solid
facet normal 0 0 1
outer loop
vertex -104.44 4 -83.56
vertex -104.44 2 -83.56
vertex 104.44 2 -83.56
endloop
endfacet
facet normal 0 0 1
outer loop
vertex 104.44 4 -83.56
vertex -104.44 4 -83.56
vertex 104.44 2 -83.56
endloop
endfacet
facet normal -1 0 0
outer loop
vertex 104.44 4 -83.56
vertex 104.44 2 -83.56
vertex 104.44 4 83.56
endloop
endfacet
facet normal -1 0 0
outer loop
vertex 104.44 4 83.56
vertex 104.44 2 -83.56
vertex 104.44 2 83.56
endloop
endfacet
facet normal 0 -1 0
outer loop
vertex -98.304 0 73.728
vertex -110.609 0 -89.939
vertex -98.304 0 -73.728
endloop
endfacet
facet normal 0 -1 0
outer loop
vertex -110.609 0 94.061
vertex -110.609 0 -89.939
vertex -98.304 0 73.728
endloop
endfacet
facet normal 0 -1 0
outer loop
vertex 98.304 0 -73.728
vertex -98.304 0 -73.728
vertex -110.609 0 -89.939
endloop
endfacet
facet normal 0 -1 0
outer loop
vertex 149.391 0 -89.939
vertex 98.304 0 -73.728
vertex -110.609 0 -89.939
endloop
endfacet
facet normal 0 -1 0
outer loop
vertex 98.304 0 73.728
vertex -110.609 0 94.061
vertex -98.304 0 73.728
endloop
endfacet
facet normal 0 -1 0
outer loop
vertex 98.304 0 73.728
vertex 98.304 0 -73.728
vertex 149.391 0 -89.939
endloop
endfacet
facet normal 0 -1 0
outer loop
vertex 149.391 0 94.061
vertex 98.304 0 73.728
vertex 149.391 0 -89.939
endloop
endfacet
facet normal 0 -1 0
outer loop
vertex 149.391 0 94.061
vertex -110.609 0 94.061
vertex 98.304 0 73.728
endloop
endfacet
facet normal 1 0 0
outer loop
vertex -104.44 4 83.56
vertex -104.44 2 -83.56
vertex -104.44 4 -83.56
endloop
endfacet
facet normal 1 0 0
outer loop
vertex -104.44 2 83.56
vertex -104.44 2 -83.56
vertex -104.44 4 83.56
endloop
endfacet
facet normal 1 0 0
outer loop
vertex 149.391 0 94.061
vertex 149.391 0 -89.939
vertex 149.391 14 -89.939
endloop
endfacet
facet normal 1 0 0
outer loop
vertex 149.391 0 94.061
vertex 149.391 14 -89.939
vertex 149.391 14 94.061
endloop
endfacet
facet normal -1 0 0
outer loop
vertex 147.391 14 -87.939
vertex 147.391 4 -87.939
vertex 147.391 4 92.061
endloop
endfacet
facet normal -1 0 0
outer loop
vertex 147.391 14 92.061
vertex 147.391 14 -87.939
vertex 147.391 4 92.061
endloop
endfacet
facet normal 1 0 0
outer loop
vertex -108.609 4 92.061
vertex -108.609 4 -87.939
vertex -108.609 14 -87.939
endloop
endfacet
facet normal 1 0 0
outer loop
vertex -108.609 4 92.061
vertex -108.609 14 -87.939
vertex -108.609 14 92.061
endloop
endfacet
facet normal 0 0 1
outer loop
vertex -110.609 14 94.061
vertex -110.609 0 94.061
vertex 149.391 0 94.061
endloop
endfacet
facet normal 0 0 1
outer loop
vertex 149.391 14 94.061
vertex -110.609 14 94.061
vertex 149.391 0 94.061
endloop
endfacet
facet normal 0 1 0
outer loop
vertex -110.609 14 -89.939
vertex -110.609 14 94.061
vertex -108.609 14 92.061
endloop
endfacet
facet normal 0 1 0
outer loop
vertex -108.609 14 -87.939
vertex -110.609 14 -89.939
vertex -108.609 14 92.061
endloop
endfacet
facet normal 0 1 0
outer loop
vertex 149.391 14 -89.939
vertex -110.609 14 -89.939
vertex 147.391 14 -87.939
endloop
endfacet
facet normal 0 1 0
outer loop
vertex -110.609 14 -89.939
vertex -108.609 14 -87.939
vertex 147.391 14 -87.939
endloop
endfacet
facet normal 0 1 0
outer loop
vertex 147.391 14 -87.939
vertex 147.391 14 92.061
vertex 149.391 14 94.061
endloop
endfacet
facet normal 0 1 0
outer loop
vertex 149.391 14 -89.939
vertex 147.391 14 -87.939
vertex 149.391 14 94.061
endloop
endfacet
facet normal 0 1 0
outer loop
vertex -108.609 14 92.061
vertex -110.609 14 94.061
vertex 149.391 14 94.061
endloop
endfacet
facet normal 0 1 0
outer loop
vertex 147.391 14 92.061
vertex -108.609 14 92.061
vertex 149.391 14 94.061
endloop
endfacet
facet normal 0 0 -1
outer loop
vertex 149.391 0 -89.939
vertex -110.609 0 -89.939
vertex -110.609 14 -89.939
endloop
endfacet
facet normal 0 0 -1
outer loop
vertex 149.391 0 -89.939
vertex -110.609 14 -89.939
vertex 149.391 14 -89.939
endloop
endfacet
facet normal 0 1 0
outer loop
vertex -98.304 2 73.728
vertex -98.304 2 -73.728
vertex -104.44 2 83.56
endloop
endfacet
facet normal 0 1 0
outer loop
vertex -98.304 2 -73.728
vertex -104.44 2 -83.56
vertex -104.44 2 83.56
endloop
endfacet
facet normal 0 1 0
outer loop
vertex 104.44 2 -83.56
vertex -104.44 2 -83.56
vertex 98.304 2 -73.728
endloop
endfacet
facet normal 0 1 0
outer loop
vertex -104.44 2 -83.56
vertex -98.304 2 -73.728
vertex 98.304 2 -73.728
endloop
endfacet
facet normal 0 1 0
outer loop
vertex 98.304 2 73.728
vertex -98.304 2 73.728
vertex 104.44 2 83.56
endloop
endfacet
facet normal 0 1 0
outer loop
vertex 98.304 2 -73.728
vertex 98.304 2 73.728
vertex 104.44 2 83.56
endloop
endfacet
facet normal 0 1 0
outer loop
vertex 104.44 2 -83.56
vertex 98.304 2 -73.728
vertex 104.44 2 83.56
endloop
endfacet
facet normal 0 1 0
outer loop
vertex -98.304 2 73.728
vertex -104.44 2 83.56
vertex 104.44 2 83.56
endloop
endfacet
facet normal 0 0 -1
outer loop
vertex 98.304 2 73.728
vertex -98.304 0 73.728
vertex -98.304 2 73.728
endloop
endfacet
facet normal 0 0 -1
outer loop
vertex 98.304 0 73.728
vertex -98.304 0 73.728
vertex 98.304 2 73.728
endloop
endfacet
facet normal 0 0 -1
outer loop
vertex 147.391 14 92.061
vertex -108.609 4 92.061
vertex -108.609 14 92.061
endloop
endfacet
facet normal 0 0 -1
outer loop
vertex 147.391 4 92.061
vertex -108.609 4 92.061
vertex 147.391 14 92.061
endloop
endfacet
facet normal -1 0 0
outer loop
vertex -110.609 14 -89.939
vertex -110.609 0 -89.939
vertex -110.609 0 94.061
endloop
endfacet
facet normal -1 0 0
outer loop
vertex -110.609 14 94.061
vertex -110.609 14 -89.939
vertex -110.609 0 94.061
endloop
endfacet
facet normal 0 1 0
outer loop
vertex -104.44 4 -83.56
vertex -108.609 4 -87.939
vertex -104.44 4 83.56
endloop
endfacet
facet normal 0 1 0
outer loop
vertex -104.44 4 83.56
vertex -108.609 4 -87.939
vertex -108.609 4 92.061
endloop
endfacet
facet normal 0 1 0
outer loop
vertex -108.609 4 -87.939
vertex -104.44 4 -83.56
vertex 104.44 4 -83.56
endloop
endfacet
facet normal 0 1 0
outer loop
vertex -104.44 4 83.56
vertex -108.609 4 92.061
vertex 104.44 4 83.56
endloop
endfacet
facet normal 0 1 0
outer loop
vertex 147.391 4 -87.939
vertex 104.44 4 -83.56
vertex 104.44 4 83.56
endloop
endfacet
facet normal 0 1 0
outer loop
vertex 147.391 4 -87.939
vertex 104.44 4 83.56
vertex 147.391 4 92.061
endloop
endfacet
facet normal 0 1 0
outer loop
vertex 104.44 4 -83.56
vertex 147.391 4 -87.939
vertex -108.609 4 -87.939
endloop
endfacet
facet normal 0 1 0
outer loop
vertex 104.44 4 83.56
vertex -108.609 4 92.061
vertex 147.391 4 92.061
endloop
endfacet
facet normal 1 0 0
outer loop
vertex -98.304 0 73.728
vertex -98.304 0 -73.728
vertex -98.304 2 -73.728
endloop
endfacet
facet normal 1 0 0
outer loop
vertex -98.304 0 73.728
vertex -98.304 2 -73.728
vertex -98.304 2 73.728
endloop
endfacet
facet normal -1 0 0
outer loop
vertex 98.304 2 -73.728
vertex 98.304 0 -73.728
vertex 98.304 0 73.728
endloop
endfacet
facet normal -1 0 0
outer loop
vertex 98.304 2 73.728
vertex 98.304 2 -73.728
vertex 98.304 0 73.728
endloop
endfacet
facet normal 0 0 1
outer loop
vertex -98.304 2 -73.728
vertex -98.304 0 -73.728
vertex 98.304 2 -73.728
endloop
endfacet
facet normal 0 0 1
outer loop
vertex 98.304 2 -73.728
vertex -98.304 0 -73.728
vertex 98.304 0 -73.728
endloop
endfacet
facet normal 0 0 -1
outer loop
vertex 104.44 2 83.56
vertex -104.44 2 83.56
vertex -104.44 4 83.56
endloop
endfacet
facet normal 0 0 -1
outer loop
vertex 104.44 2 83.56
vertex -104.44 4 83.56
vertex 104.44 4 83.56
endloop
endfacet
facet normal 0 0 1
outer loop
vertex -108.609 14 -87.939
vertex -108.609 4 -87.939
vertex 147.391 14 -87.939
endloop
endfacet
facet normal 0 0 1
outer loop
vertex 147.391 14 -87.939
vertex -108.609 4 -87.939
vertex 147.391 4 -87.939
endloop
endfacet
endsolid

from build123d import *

# Parameters (mm, degrees)
F0_W     = 260
F0_H     = 184
F0_W_2   = 256
F0_H_2   = 180
F1_DEPTH = 14
F0_W_3   = 208.88
F0_H_3   = 167.12
F2_DEPTH = 4
F0_W_4   = 196.608
F0_H_4   = 147.456
F3_DEPTH = 2


with BuildPart() as f1:
    # F0 (on Front) → F1 (new body)
    with BuildSketch(Plane.XZ):
        with Locations((19.391128, 2.061408)):
            Rectangle(F0_W, F0_H)
        with Locations((19.391128, 2.061408)):
            Rectangle(F0_W_2, F0_H_2, mode=Mode.SUBTRACT)
    extrude(amount=-F1_DEPTH)

    # F0 (on Front) → F2 (join)
    with BuildSketch(Plane.XZ):
        with Locations((19.391128, 2.061408)):
            Rectangle(F0_W_2, F0_H_2)
        Rectangle(F0_W_3, F0_H_3, mode=Mode.SUBTRACT)
    extrude(amount=-F2_DEPTH)

    # F0 (on Front) → F3 (join)
    with BuildSketch(Plane.XZ):
        Rectangle(F0_W_3, F0_H_3)
        Rectangle(F0_W_4, F0_H_4, mode=Mode.SUBTRACT)
    extrude(amount=-F3_DEPTH)


solid = f1.part
